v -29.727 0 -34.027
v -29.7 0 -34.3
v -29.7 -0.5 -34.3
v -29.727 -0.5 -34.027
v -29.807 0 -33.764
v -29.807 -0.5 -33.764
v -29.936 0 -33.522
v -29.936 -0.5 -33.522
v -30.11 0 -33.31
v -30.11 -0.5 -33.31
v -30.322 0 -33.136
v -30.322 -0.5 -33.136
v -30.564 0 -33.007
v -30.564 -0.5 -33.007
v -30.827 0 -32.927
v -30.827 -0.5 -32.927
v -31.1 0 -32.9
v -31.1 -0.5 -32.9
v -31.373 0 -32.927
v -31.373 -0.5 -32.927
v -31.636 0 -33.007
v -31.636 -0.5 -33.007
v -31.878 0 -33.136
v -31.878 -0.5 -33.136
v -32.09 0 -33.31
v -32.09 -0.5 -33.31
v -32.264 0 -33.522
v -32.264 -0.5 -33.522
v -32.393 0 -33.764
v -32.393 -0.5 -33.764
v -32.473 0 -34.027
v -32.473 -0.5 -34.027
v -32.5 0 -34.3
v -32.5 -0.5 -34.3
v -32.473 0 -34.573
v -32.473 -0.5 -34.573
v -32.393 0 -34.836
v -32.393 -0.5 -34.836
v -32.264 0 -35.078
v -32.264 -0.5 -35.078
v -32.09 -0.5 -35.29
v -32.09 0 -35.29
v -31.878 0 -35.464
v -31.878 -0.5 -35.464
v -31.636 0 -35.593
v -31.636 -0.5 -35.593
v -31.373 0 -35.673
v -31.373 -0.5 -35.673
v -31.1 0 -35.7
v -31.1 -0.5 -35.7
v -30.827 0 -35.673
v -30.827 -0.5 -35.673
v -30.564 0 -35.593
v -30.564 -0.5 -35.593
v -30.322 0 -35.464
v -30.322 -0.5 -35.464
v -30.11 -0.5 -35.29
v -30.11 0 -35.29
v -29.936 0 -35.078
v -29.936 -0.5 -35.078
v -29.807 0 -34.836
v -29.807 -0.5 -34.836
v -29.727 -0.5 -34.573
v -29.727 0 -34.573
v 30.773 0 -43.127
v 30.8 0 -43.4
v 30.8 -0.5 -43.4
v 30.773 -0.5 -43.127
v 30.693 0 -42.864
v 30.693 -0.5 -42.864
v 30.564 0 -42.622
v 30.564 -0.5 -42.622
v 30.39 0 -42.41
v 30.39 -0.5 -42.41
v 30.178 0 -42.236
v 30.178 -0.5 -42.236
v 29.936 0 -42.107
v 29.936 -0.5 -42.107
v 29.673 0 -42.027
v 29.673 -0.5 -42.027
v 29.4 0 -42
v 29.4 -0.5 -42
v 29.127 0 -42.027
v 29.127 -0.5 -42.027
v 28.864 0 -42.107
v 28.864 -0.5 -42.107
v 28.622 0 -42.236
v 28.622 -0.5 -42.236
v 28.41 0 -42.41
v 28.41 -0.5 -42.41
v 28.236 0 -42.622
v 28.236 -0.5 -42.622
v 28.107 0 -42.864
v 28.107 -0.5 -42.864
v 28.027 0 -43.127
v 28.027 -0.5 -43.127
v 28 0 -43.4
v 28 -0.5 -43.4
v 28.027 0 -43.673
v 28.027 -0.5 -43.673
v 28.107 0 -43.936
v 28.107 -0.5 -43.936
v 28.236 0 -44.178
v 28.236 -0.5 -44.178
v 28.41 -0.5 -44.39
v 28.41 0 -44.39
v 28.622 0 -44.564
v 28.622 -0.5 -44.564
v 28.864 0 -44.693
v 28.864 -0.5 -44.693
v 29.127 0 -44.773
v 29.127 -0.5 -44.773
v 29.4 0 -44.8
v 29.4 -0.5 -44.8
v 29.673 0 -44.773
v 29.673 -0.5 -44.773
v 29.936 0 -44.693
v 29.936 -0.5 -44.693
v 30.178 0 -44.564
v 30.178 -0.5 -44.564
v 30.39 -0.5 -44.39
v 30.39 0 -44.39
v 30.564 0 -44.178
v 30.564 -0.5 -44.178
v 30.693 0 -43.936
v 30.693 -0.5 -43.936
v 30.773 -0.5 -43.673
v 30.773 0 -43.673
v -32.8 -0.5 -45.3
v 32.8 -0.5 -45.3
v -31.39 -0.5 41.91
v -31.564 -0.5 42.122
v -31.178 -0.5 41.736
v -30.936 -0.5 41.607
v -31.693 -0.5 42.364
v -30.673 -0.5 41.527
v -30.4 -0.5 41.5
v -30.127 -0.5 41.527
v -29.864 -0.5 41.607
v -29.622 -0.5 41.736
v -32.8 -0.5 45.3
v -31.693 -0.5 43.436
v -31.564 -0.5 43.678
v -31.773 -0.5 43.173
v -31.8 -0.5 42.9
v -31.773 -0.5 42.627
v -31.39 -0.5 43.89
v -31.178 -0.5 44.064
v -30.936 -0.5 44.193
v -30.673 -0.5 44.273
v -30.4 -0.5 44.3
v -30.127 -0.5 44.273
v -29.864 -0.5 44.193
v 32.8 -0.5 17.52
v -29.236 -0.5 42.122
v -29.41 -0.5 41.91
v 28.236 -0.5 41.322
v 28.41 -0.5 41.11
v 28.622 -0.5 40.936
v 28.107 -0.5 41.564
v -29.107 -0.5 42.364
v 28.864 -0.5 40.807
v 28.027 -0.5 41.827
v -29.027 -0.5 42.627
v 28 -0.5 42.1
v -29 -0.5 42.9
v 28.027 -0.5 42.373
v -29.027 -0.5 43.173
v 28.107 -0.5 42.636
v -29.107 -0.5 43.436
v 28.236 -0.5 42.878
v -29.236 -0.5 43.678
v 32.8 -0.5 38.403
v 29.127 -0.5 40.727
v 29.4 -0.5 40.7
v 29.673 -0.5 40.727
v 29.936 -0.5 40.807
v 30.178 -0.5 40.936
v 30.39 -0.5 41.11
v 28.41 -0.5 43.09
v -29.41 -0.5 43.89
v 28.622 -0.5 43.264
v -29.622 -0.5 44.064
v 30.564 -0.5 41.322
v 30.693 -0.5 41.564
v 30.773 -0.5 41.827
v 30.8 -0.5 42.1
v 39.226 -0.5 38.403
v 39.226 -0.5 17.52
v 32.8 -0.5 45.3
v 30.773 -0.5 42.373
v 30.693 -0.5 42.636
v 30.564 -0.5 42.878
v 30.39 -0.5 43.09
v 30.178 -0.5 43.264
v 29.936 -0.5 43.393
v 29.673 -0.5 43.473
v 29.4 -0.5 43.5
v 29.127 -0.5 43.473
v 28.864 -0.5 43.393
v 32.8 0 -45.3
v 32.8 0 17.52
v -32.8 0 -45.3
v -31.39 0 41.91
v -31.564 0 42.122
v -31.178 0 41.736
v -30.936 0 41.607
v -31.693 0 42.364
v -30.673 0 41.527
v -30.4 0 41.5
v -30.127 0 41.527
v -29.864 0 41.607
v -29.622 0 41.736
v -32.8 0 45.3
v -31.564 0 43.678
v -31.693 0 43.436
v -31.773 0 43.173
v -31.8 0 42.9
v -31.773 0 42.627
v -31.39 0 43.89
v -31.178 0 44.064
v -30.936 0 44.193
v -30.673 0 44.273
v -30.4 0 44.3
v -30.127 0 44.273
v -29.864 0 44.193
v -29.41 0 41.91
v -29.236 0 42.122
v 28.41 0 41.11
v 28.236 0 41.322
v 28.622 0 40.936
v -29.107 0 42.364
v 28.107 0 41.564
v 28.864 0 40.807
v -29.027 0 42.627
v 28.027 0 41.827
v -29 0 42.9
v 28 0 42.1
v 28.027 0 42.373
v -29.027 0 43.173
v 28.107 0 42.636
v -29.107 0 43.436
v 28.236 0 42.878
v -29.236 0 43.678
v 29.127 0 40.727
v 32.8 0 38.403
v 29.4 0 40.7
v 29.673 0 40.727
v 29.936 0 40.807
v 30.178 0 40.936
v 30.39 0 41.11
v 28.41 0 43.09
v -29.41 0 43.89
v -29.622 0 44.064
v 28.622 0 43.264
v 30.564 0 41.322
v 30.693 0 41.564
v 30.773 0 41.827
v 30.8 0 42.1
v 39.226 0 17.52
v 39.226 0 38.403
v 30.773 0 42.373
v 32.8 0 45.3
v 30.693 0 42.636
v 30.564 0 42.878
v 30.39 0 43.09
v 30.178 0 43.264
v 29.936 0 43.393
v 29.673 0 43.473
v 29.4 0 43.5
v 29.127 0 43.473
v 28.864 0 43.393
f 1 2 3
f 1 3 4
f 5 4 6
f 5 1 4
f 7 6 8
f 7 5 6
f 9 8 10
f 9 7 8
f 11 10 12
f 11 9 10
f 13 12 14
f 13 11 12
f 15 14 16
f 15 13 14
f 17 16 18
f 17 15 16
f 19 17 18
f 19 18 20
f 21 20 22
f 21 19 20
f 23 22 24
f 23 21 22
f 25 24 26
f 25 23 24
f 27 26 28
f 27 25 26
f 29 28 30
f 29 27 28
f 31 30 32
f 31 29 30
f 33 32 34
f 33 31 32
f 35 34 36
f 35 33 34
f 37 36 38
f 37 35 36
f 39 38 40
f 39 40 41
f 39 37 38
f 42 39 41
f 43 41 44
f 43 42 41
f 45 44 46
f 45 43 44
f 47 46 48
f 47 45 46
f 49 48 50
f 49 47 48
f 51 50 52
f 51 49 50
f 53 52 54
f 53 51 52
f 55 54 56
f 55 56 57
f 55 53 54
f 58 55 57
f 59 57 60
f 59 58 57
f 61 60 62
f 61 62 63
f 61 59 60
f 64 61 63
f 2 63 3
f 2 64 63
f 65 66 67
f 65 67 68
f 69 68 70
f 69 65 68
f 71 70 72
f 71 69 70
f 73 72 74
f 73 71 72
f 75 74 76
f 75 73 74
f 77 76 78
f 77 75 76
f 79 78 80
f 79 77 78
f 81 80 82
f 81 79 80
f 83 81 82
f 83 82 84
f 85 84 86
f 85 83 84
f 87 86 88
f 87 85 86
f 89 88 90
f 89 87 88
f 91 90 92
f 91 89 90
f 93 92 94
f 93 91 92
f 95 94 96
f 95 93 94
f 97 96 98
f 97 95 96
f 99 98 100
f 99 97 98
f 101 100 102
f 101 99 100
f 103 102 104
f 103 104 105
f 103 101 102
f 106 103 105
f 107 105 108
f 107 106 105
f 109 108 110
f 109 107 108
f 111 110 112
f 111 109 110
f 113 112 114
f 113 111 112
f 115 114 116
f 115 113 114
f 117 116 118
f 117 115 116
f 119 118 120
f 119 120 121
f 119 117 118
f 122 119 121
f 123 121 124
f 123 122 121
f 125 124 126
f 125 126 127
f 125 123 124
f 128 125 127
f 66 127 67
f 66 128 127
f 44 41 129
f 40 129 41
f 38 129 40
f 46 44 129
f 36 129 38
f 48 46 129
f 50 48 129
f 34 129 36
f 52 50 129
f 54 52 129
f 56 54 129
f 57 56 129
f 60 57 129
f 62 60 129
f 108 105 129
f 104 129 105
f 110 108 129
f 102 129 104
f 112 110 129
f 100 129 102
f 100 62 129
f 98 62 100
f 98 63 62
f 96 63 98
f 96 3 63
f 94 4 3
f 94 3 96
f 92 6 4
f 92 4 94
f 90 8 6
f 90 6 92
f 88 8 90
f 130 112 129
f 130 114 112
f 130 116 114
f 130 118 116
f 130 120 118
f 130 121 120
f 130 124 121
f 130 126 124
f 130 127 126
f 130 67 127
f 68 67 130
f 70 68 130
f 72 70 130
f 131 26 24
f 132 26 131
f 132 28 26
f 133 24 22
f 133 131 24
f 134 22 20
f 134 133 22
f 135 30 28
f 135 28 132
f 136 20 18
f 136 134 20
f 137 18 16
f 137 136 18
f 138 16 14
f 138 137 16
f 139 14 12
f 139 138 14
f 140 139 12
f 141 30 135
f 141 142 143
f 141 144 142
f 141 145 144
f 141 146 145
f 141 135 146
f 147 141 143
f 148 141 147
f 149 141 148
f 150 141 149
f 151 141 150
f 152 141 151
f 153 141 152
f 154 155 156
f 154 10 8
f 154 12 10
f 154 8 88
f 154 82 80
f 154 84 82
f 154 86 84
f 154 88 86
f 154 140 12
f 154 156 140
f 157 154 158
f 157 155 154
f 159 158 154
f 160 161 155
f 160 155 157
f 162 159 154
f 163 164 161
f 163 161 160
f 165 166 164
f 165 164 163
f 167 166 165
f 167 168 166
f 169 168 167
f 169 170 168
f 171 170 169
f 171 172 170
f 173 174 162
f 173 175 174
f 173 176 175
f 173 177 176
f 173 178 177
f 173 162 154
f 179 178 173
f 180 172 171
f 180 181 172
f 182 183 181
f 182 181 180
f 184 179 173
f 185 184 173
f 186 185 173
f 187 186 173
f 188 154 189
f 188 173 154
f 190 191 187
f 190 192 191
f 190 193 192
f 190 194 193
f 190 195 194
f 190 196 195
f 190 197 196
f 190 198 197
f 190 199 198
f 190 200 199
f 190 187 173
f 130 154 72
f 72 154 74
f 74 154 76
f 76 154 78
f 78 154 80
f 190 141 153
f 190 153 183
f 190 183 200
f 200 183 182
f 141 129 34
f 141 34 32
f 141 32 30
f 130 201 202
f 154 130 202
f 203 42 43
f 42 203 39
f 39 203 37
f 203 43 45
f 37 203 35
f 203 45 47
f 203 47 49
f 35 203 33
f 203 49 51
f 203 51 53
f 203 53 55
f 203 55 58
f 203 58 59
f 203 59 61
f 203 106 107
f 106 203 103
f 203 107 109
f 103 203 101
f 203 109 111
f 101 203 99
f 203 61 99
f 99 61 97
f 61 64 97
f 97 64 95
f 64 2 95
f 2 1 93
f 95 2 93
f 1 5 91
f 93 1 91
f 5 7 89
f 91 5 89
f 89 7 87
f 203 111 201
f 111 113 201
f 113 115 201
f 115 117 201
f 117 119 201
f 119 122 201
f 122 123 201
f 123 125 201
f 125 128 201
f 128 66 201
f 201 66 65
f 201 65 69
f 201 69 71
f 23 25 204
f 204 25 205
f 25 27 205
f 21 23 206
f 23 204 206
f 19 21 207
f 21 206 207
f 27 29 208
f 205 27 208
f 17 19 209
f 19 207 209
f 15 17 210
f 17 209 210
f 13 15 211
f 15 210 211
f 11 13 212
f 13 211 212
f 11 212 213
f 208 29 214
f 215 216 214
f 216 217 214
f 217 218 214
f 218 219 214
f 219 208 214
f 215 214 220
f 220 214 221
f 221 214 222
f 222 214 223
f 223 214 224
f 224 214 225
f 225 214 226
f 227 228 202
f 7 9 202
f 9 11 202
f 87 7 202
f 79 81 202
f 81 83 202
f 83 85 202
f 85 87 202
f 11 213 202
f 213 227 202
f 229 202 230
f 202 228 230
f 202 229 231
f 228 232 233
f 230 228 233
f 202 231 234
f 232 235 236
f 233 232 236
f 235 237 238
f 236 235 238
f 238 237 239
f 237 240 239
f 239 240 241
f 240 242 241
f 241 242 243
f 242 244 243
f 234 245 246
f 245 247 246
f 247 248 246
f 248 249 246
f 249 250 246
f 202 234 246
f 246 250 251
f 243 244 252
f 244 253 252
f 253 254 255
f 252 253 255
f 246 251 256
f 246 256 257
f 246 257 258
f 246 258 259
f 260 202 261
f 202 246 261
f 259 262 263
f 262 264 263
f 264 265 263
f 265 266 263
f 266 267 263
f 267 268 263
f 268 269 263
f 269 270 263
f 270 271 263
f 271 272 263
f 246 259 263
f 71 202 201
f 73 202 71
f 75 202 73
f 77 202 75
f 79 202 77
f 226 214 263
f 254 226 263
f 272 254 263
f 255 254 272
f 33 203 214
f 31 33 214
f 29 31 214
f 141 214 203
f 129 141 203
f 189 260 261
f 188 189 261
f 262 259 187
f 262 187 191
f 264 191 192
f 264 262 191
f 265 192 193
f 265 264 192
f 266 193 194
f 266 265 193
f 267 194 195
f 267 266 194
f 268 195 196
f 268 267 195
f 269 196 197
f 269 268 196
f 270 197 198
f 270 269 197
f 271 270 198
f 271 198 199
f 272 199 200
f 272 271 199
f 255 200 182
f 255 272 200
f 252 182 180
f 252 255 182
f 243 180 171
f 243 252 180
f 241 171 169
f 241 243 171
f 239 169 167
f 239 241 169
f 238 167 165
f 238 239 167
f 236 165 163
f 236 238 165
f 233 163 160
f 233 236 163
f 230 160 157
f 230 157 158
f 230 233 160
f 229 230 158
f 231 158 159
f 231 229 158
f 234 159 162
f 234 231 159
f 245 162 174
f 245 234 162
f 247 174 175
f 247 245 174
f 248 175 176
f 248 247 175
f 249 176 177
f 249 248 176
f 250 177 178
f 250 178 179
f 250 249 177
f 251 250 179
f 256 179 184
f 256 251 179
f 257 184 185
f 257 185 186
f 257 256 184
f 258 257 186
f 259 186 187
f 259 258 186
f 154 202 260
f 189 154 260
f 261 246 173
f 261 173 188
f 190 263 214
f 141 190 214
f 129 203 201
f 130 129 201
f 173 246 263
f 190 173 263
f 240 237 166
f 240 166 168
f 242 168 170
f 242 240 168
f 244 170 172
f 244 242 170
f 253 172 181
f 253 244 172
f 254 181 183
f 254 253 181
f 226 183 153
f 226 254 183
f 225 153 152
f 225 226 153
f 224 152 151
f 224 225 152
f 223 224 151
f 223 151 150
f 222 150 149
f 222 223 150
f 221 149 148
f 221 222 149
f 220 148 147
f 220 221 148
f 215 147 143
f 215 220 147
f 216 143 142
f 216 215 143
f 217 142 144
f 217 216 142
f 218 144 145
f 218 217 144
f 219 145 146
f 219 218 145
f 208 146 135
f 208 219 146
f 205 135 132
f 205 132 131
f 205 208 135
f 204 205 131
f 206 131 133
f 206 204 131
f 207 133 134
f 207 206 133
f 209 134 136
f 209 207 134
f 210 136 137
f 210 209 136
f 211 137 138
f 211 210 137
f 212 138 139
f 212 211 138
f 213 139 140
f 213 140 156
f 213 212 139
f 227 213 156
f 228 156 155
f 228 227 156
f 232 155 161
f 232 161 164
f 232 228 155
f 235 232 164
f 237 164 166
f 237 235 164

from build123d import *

# Parameters (mm, degrees)
F0_R     = 1.4
F0_W     = 6.426
F0_H     = 20.883
F1_DEPTH = 0.5


with BuildPart() as f1:
    # F0 (on Front) → F1 (new body)
    with BuildSketch(Plane.XZ):
        Polygon((-32.8, -45.3), (32.8, -45.3), (32.8, 17.52029), (32.8, 38.40329), (32.8, 45.3), (-32.8, 45.3), align=None)
        with Locations((-31.1, -34.3)):
            Circle(F0_R, mode=Mode.SUBTRACT)
        with Locations((29.4, -43.4)):
            Circle(F0_R, mode=Mode.SUBTRACT)
        with Locations((-30.4, 42.9)):
            Circle(F0_R, mode=Mode.SUBTRACT)
        with Locations((29.4, 42.1)):
            Circle(F0_R, mode=Mode.SUBTRACT)
        with Locations((36.013, 27.96179)):
            Rectangle(F0_W, F0_H)
    extrude(amount=F1_DEPTH)


solid = f1.part
